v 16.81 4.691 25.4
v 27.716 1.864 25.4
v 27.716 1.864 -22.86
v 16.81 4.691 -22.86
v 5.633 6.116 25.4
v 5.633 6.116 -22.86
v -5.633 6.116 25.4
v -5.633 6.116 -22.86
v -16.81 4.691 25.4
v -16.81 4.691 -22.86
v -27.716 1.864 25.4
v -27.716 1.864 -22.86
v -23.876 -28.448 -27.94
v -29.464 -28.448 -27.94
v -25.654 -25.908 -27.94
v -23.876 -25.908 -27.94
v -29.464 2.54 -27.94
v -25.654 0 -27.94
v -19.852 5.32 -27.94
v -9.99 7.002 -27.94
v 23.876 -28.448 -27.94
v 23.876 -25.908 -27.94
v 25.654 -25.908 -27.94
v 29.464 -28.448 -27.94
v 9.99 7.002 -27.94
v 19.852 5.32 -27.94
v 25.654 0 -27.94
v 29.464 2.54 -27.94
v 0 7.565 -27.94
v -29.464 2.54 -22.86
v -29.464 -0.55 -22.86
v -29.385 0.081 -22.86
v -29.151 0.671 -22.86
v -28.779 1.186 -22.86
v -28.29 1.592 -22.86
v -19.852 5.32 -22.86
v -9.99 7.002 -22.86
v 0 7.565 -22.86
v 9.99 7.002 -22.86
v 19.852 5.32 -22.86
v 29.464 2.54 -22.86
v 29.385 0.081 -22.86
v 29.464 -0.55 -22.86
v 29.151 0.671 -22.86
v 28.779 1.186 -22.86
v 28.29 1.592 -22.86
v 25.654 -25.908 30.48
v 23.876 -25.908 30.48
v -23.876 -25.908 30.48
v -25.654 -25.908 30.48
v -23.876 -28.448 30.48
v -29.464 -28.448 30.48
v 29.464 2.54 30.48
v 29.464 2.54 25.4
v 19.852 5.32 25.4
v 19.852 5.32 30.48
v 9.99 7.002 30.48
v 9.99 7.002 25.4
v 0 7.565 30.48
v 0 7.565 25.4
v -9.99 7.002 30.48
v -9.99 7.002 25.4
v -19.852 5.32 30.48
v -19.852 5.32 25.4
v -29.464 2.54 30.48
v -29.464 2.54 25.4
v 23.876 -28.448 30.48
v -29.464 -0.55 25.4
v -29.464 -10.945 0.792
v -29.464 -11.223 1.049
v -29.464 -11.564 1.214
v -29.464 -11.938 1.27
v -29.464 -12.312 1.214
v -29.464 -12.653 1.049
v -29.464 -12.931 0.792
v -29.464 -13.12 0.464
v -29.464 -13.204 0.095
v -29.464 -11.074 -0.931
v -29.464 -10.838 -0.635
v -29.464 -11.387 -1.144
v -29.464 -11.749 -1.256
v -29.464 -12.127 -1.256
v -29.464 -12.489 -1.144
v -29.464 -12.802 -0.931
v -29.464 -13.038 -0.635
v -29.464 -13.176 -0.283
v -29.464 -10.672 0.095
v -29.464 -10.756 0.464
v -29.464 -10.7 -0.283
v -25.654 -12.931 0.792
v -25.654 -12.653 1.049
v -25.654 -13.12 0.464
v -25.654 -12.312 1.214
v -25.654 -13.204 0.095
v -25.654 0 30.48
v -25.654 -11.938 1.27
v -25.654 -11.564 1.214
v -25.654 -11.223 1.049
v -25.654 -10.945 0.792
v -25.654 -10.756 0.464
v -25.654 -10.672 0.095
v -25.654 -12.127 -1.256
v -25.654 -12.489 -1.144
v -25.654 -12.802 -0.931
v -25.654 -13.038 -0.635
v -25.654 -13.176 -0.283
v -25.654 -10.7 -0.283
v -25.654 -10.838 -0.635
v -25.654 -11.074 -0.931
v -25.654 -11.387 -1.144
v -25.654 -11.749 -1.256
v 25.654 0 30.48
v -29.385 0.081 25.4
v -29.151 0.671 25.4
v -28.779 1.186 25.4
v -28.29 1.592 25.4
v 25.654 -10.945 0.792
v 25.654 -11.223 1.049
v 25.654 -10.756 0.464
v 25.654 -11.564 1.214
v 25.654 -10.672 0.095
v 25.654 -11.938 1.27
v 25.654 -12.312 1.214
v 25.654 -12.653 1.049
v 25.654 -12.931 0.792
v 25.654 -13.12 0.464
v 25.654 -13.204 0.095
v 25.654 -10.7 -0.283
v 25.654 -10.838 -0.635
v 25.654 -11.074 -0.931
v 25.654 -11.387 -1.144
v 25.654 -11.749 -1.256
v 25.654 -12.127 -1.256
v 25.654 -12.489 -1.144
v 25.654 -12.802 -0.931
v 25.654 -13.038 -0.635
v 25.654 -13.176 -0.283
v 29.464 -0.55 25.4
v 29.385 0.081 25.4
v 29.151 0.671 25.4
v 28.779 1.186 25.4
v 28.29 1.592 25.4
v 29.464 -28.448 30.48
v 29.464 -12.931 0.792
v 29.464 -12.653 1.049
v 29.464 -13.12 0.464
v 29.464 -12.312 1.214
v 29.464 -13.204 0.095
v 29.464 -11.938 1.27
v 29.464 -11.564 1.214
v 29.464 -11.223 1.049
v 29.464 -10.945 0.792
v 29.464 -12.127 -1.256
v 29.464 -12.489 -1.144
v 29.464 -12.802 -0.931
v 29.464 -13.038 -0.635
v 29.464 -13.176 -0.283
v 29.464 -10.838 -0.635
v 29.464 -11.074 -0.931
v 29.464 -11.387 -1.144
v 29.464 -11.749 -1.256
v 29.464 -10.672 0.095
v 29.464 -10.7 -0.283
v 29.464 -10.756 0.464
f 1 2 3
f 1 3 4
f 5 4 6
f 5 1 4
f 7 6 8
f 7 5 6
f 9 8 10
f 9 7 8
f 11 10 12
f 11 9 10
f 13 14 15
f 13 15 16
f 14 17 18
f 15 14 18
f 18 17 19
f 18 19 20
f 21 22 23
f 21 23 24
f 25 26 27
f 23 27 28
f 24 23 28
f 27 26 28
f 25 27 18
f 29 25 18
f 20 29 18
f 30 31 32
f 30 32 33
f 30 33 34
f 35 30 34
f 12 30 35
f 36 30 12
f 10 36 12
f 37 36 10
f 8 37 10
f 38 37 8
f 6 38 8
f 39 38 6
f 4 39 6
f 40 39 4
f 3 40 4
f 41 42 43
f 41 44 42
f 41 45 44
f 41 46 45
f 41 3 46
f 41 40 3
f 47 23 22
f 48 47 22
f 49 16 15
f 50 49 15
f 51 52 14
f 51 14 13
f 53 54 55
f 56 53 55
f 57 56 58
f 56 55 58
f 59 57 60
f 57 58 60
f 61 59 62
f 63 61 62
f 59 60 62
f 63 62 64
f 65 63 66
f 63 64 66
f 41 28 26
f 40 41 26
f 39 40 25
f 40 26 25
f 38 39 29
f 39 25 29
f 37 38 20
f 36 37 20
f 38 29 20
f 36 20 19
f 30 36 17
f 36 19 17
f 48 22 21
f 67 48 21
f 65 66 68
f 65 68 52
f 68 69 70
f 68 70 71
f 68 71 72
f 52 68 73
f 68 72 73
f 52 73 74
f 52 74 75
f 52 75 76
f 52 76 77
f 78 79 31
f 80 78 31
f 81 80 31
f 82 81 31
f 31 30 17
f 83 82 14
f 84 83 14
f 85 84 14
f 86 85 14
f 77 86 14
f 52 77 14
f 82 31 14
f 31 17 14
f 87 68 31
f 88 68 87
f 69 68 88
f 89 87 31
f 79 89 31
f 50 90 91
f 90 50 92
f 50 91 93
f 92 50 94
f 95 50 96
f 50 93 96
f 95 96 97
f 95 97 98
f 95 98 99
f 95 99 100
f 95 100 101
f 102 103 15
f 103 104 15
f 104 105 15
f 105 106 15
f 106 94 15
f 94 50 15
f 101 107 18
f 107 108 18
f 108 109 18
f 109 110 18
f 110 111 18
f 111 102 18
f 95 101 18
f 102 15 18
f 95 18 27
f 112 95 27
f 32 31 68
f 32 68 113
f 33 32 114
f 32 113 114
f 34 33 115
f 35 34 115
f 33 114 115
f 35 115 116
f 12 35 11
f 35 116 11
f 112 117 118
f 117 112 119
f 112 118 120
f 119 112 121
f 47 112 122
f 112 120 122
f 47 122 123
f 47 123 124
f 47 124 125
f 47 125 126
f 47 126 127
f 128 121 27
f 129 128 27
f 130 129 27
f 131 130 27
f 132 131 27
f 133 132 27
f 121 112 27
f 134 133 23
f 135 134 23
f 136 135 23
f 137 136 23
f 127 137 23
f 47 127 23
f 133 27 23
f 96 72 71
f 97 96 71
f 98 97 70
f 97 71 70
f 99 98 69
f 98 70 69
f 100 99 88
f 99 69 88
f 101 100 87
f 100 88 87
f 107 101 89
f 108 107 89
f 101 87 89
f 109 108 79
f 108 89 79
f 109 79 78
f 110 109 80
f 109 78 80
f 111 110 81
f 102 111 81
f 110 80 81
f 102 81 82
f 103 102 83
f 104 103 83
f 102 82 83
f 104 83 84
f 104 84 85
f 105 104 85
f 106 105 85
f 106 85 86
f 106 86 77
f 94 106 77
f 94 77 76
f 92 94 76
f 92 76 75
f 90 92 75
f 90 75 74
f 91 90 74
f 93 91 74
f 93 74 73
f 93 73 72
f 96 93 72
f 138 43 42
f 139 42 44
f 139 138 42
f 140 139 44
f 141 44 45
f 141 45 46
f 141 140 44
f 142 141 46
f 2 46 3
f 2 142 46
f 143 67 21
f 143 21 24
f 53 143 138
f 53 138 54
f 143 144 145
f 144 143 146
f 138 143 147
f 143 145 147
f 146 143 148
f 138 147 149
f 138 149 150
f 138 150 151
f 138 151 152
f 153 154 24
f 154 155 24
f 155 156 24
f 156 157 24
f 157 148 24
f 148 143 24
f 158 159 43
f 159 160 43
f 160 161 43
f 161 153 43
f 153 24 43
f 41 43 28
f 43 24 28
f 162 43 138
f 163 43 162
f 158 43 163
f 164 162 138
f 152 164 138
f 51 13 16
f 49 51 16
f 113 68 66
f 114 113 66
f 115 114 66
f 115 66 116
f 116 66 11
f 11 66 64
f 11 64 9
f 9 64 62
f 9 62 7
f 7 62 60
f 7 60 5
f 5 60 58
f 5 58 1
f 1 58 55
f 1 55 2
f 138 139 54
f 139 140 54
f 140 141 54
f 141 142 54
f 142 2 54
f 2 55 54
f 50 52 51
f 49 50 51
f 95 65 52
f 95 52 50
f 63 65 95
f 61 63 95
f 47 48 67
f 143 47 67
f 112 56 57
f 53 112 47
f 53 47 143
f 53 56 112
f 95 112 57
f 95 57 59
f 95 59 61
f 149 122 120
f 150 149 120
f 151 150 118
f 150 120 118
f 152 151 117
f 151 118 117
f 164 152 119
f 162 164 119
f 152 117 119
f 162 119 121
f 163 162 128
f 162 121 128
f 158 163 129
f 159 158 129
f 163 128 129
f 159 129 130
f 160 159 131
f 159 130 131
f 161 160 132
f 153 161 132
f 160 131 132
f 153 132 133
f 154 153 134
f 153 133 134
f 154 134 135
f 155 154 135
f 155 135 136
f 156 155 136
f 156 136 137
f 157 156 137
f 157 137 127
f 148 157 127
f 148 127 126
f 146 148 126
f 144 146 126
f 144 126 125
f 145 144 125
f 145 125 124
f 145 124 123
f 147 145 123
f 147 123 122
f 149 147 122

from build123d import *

# Parameters (mm, degrees)
BOSS_EXTRUDE1_DEPTH = 25.4
BOSS_EXTRUDE2_DEPTH = 5.08
LPATTERN1_COUNT     = 2
LPATTERN1_PITCH     = 53.34
FILLET7_R           = 2.54
SKETCH4_R           = 1.27
CUT_EXTRUDE1_DEPTH  = 73.186067132


with BuildPart() as part:
    # Sketch1 → Boss-Extrude1 (new, symmetric)
    with BuildSketch(Plane.XY):
        with BuildLine():
            Line((-25.654, 0), (25.654, 0))
            Line((25.654, 0), (25.654, -25.908))
            Line((25.654, -25.908), (23.876, -25.908))
            Line((23.876, -25.908), (23.876, -28.448))
            Line((23.876, -28.448), (29.464, -28.448))
            Line((29.464, -28.448), (29.464, 1.27))
            ThreePointArc((29.464, 1.27), (0, 6.294600126), (-29.464, 1.27))
            Line((-29.464, 1.27), (-29.464, -28.448))
            Line((-29.464, -28.448), (-23.876, -28.448))
            Line((-23.876, -28.448), (-23.876, -25.908))
            Line((-23.876, -25.908), (-25.654, -25.908))
            Line((-25.654, -25.908), (-25.654, 0))
        make_face()
    extrude(amount=BOSS_EXTRUDE1_DEPTH, both=True)

    # Sketch2 → Boss-Extrude2 (add)
    with BuildSketch(Plane.XY.offset(25.4)):
        with BuildLine():
            Line((29.464, -28.448), (29.464, 2.54))
            ThreePointArc((29.464, 2.54), (0, 7.564600126), (-29.464, 2.54))
            Line((-29.464, 2.54), (-29.464, -28.448))
            Line((-29.464, -28.448), (-23.876, -28.448))
            Line((-23.876, -28.448), (-23.876, -25.908))
            Line((-23.876, -25.908), (-25.654, -25.908))
            Line((-25.654, -25.908), (-25.654, 0))
            Line((-25.654, 0), (25.654, 0))
            Line((25.654, 0), (25.654, -25.908))
            Line((25.654, -25.908), (23.876, -25.908))
            Line((23.876, -25.908), (23.876, -28.448))
            Line((23.876, -28.448), (29.464, -28.448))
        make_face()
    boss_extrude2 = extrude(amount=BOSS_EXTRUDE2_DEPTH)

    # LPattern1: Boss-Extrude2 ×2
    with Locations(*[(0, 0, -i * LPATTERN1_PITCH) for i in range(1, LPATTERN1_COUNT)]):
        add(boss_extrude2)

    # Fillet7
    fillet7_edges = [part.edges().sort_by_distance(p)[0] for p in [
        (-29.464, 1.27, 1.27),
        (29.464, 1.27, 1.27),
    ]]
    fillet(fillet7_edges, radius=FILLET7_R)

    # Sketch4 → Cut-Extrude1 (cut, through all)
    with BuildSketch(Plane.ZY.offset(29.464)):
        with Locations((0, -11.938)):
            Circle(SKETCH4_R)
    extrude(amount=-CUT_EXTRUDE1_DEPTH, mode=Mode.SUBTRACT)


solid = part.part
